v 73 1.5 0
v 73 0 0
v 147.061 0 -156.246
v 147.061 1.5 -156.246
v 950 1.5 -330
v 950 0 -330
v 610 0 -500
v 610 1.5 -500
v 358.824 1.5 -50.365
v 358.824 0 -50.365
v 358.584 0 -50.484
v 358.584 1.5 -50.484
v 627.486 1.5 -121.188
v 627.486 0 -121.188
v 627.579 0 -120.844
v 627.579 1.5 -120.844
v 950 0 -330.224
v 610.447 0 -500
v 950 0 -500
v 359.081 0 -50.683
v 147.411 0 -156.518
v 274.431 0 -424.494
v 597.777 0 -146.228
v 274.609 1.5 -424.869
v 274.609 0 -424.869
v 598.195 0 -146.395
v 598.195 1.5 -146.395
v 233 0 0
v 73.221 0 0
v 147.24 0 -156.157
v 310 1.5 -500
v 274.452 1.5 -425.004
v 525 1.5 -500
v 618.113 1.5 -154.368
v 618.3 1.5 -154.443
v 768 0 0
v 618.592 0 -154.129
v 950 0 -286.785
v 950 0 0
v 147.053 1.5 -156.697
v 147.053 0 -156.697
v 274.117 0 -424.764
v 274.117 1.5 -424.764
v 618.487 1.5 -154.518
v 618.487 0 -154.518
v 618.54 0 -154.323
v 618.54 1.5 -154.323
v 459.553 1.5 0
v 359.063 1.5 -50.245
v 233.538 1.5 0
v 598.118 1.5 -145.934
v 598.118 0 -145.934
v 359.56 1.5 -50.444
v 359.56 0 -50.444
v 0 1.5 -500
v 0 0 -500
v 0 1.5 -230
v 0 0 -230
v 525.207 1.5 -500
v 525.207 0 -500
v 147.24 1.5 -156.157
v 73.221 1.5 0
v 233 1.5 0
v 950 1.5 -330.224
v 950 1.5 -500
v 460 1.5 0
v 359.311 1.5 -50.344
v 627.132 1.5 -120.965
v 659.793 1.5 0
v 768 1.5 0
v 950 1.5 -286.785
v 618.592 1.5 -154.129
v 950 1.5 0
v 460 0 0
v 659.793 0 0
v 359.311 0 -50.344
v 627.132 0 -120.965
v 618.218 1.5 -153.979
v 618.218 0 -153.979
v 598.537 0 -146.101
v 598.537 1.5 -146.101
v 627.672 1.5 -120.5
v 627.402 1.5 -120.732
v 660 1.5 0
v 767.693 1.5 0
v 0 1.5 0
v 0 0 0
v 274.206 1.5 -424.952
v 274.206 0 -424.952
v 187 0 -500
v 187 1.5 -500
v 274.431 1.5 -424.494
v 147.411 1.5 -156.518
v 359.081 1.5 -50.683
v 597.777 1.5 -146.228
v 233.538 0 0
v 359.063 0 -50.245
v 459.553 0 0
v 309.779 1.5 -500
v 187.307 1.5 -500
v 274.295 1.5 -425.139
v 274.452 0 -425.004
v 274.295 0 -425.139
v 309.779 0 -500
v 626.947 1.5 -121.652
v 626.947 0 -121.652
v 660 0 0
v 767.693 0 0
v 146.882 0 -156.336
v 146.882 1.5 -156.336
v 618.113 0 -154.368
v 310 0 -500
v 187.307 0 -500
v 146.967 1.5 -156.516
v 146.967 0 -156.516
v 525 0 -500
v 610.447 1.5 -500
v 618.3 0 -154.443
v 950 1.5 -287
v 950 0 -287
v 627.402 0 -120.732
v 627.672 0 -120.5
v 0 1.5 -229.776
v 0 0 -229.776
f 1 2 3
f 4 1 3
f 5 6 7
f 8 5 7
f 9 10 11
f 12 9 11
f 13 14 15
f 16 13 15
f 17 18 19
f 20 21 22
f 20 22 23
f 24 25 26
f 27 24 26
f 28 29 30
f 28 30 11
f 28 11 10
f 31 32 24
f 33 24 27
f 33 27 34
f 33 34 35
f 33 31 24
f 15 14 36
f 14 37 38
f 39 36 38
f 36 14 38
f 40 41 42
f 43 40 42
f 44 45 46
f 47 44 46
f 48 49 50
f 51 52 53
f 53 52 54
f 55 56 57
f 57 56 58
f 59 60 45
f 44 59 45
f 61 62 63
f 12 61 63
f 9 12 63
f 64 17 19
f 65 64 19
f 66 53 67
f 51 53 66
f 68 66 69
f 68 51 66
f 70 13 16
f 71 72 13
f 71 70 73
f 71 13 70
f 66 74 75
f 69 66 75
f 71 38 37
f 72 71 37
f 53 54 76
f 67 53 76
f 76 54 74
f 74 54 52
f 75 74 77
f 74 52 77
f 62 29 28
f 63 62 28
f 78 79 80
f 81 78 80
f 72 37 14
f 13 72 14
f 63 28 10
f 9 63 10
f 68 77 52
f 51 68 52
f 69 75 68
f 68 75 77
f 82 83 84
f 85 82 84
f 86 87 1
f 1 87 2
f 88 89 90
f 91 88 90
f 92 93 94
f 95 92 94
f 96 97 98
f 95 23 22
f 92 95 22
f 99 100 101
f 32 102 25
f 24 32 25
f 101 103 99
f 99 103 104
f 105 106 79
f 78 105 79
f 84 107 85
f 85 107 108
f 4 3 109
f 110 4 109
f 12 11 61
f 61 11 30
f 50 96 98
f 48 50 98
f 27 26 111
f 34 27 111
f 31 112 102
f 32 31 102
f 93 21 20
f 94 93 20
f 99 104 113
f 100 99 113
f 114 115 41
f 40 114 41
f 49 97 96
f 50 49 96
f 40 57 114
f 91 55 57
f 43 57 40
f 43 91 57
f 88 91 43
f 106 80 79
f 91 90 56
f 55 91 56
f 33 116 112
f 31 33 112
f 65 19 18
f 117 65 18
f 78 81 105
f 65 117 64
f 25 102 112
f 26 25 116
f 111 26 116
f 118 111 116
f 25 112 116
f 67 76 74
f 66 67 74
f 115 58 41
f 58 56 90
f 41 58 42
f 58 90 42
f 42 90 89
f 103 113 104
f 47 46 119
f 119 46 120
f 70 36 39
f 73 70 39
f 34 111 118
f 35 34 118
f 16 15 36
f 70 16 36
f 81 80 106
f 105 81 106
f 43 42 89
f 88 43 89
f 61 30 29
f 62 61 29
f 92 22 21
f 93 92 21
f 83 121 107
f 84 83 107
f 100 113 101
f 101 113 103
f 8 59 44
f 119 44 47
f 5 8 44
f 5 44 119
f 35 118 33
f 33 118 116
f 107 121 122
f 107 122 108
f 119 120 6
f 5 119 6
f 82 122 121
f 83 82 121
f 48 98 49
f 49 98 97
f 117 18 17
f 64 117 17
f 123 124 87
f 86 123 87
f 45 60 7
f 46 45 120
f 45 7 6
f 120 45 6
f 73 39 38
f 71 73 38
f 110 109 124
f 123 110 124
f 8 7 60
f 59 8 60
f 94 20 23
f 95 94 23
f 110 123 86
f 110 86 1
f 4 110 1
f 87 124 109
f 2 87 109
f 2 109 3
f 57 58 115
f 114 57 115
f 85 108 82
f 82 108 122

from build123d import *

# Parameters (mm, degrees)
BOSS_EXTRU_1_DEPTH    = 1.5
BOSS_EXTRU_1_2_DEPTH  = 1.5
BOSS_EXTRU_1_3_DEPTH  = 1.5
BOSS_EXTRU_1_4_DEPTH  = 1.5
BOSS_EXTRU_1_5_DEPTH  = 1.5
BOSS_EXTRU_1_6_DEPTH  = 1.5
BOSS_EXTRU_1_7_DEPTH  = 1.5
BOSS_EXTRU_1_8_DEPTH  = 1.5
BOSS_EXTRU_1_9_DEPTH  = 1.5
BOSS_EXTRU_1_10_DEPTH = 1.5
BOSS_EXTRU_1_11_DEPTH = 1.5
BOSS_EXTRU_1_12_DEPTH = 1.5
BOSS_EXTRU_1_13_DEPTH = 1.5


with BuildPart() as part:
    # Esquisse1 → Boss.-Extru.1 (new body)
    with BuildSketch(Plane(origin=(0, 0, 0), x_dir=(1, 0, 0), z_dir=(0, 1, 0))):
        Polygon((0, 500), (0, 230), (146.967396798, 156.516301601), (147.053079597, 156.697066999), (274.117042274, 424.764498808), (274.205876744, 424.951913301), (187, 500), align=None)
    extrude(amount=BOSS_EXTRU_1_DEPTH)


with BuildPart() as body_2:
    # Esquisse1 → Boss.-Extru.1 2 (new body)
    with BuildSketch(Plane(origin=(0, 0, 0), x_dir=(1, 0, 0), z_dir=(0, 1, 0))):
        Polygon((146.881713999, 156.335536203), (0, 229.776393202), (0, 0), (73, 0), (147.060638947, 156.246073729), align=None)
    extrude(amount=BOSS_EXTRU_1_2_DEPTH)


with BuildPart() as body_3:
    # Esquisse1 → Boss.-Extru.1 3 (new body)
    with BuildSketch(Plane(origin=(0, 0, 0), x_dir=(1, 0, 0), z_dir=(0, 1, 0))):
        Polygon((309.778669839, 500), (187.306610111, 500), (274.294711214, 425.139327794), align=None)
    extrude(amount=BOSS_EXTRU_1_3_DEPTH)


with BuildPart() as body_4:
    # Esquisse1 → Boss.-Extru.1 4 (new body)
    with BuildSketch(Plane(origin=(0, 0, 0), x_dir=(1, 0, 0), z_dir=(0, 1, 0))):
        Polygon((358.58437264, 50.484206882), (147.239563895, 156.156611255), (73.221330161, 0), (233, 0), (358.823662163, 50.364562121), align=None)
    extrude(amount=BOSS_EXTRU_1_4_DEPTH)


with BuildPart() as body_5:
    # Esquisse1 → Boss.-Extru.1 5 (new body)
    with BuildSketch(Plane(origin=(0, 0, 0), x_dir=(1, 0, 0), z_dir=(0, 1, 0))):
        Polygon((274.431450155, 424.49392404), (147.410929493, 156.518142051), (359.081122676, 50.68304546), (597.77664453, 146.227835937), align=None)
    extrude(amount=BOSS_EXTRU_1_5_DEPTH)


with BuildPart() as body_6:
    # Esquisse1 → Boss.-Extru.1 6 (new body)
    with BuildSketch(Plane(origin=(0, 0, 0), x_dir=(1, 0, 0), z_dir=(0, 1, 0))):
        Polygon((525, 500), (310, 500), (274.451915154, 425.00404041), (274.609119095, 424.868753026), (598.195189423, 146.395370643), (618.113419218, 154.368218553), (618.300375619, 154.443053263), align=None)
    extrude(amount=BOSS_EXTRU_1_6_DEPTH)


with BuildPart() as body_7:
    # Esquisse1 → Boss.-Extru.1 7 (new body)
    with BuildSketch(Plane(origin=(0, 0, 0), x_dir=(1, 0, 0), z_dir=(0, 1, 0))):
        Polygon((359.559701721, 50.443755937), (359.311326703, 50.344336649), (460, 0), (659.792838227, 0), (627.132357343, 120.964744015), (598.118358298, 145.933762127), align=None)
    extrude(amount=BOSS_EXTRU_1_7_DEPTH)


with BuildPart() as body_8:
    # Esquisse1 → Boss.-Extru.1 8 (new body)
    with BuildSketch(Plane(origin=(0, 0, 0), x_dir=(1, 0, 0), z_dir=(0, 1, 0))):
        Polygon((359.062951685, 50.24491736), (233.538192985, 0), (459.552786405, 0), align=None)
    extrude(amount=BOSS_EXTRU_1_8_DEPTH)


with BuildPart() as body_9:
    # Esquisse1 → Boss.-Extru.1 9 (new body)
    with BuildSketch(Plane(origin=(0, 0, 0), x_dir=(1, 0, 0), z_dir=(0, 1, 0))):
        Polygon((610, 500), (525.207161773, 500), (618.48733202, 154.517887973), (618.539824278, 154.323472201), (950, 287), (950, 330), align=None)
    extrude(amount=BOSS_EXTRU_1_9_DEPTH)


with BuildPart() as body_10:
    # Esquisse1 → Boss.-Extru.1 10 (new body)
    with BuildSketch(Plane(origin=(0, 0, 0), x_dir=(1, 0, 0), z_dir=(0, 1, 0))):
        Polygon((627.402225034, 120.732499876), (660, 0), (767.693389889, 0), (627.672092724, 120.500255736), align=None)
    extrude(amount=BOSS_EXTRU_1_10_DEPTH)


with BuildPart() as body_11:
    # Esquisse1 → Boss.-Extru.1 11 (new body)
    with BuildSketch(Plane(origin=(0, 0, 0), x_dir=(1, 0, 0), z_dir=(0, 1, 0))):
        Polygon((950, 500), (610.447213595, 500), (950, 330.223606798), align=None)
    extrude(amount=BOSS_EXTRU_1_11_DEPTH)


with BuildPart() as body_12:
    # Esquisse1 → Boss.-Extru.1 12 (new body)
    with BuildSketch(Plane(origin=(0, 0, 0), x_dir=(1, 0, 0), z_dir=(0, 1, 0))):
        Polygon((618.218403735, 153.979387009), (598.536903191, 146.101296833), (626.946741357, 121.652210631), align=None)
    extrude(amount=BOSS_EXTRU_1_12_DEPTH)


with BuildPart() as body_13:
    # Esquisse1 → Boss.-Extru.1 13 (new body)
    with BuildSketch(Plane(origin=(0, 0, 0), x_dir=(1, 0, 0), z_dir=(0, 1, 0))):
        Polygon((950, 286.784572682), (618.592316537, 154.129056429), (627.486476737, 121.187722352), (627.579284731, 120.843989044), (768, 0), (950, 0), align=None)
    extrude(amount=BOSS_EXTRU_1_13_DEPTH)


solid = Compound([part.part, body_2.part, body_3.part, body_4.part, body_5.part, body_6.part, body_7.part, body_8.part, body_9.part, body_10.part, body_11.part, body_12.part, body_13.part])
